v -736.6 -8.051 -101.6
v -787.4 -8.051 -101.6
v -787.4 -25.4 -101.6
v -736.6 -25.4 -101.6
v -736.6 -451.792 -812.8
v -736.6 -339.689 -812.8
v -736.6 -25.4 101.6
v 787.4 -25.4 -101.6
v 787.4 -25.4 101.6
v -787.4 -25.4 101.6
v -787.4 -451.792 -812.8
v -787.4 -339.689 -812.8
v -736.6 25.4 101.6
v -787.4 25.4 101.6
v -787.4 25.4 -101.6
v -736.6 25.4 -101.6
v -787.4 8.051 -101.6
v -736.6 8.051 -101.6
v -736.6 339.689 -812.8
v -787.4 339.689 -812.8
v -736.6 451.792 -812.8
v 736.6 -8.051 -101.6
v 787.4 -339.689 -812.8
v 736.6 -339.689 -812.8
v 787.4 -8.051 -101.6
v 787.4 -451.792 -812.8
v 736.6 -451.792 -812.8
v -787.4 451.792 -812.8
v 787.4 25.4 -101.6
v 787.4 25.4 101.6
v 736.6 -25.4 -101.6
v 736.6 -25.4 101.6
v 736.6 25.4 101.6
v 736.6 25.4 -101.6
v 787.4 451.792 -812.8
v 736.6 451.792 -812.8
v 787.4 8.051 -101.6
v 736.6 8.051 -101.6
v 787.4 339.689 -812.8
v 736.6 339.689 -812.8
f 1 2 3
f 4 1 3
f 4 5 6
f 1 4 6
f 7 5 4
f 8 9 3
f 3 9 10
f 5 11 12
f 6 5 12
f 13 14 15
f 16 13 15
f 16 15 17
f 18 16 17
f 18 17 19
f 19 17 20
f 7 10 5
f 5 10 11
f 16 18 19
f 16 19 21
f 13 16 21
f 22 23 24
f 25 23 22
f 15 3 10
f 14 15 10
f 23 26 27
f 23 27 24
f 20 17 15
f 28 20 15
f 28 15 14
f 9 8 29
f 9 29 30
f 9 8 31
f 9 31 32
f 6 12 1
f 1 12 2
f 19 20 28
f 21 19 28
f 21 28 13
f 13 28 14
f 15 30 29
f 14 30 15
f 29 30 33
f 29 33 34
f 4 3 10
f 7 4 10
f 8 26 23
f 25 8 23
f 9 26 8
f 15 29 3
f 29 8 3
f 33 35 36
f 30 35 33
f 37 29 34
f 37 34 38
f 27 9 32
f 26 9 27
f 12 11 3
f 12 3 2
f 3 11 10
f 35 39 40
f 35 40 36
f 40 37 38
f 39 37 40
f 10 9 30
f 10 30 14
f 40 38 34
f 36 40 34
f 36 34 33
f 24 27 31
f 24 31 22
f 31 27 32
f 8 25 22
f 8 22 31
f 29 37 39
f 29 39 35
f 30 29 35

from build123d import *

# Parameters (mm, degrees)
F0_W     = 787.4
F0_H     = 203.2
F1_DEPTH = 25.4
F3_DEPTH = 50.8


with BuildPart() as f1:
    # F0 (on Front) → F1 (new body, symmetric)
    with BuildSketch(Plane.XZ):
        with Locations((393.7, 0)):
            Rectangle(F0_W, F0_H)
    extrude(amount=F1_DEPTH, both=True)

    # F4: F1 across plane


with BuildPart() as f3:
    # F2 (on face) → F3 (new body)
    with BuildSketch(Plane.YZ.offset(787.4)):
        Polygon((-339.688526, -812.8), (-8.05052, -101.6), (-25.4, -101.6), (-25.4, 101.6), (-451.791723, -812.8), align=None)
        Polygon((25.4, 101.6), (25.4, -101.6), (8.05052, -101.6), (339.688526, -812.8), (451.791723, -812.8), align=None)
    extrude(amount=-F3_DEPTH)


with BuildPart() as f1_1:
    add(f1.part)
    add(f1.part.mirror(Plane.YZ))


with BuildPart() as f5_1:
    # F5: instance of F3
    add(f3.part.mirror(Plane.YZ))


solid = Compound([f3.part, f1_1.part, f5_1.part])
